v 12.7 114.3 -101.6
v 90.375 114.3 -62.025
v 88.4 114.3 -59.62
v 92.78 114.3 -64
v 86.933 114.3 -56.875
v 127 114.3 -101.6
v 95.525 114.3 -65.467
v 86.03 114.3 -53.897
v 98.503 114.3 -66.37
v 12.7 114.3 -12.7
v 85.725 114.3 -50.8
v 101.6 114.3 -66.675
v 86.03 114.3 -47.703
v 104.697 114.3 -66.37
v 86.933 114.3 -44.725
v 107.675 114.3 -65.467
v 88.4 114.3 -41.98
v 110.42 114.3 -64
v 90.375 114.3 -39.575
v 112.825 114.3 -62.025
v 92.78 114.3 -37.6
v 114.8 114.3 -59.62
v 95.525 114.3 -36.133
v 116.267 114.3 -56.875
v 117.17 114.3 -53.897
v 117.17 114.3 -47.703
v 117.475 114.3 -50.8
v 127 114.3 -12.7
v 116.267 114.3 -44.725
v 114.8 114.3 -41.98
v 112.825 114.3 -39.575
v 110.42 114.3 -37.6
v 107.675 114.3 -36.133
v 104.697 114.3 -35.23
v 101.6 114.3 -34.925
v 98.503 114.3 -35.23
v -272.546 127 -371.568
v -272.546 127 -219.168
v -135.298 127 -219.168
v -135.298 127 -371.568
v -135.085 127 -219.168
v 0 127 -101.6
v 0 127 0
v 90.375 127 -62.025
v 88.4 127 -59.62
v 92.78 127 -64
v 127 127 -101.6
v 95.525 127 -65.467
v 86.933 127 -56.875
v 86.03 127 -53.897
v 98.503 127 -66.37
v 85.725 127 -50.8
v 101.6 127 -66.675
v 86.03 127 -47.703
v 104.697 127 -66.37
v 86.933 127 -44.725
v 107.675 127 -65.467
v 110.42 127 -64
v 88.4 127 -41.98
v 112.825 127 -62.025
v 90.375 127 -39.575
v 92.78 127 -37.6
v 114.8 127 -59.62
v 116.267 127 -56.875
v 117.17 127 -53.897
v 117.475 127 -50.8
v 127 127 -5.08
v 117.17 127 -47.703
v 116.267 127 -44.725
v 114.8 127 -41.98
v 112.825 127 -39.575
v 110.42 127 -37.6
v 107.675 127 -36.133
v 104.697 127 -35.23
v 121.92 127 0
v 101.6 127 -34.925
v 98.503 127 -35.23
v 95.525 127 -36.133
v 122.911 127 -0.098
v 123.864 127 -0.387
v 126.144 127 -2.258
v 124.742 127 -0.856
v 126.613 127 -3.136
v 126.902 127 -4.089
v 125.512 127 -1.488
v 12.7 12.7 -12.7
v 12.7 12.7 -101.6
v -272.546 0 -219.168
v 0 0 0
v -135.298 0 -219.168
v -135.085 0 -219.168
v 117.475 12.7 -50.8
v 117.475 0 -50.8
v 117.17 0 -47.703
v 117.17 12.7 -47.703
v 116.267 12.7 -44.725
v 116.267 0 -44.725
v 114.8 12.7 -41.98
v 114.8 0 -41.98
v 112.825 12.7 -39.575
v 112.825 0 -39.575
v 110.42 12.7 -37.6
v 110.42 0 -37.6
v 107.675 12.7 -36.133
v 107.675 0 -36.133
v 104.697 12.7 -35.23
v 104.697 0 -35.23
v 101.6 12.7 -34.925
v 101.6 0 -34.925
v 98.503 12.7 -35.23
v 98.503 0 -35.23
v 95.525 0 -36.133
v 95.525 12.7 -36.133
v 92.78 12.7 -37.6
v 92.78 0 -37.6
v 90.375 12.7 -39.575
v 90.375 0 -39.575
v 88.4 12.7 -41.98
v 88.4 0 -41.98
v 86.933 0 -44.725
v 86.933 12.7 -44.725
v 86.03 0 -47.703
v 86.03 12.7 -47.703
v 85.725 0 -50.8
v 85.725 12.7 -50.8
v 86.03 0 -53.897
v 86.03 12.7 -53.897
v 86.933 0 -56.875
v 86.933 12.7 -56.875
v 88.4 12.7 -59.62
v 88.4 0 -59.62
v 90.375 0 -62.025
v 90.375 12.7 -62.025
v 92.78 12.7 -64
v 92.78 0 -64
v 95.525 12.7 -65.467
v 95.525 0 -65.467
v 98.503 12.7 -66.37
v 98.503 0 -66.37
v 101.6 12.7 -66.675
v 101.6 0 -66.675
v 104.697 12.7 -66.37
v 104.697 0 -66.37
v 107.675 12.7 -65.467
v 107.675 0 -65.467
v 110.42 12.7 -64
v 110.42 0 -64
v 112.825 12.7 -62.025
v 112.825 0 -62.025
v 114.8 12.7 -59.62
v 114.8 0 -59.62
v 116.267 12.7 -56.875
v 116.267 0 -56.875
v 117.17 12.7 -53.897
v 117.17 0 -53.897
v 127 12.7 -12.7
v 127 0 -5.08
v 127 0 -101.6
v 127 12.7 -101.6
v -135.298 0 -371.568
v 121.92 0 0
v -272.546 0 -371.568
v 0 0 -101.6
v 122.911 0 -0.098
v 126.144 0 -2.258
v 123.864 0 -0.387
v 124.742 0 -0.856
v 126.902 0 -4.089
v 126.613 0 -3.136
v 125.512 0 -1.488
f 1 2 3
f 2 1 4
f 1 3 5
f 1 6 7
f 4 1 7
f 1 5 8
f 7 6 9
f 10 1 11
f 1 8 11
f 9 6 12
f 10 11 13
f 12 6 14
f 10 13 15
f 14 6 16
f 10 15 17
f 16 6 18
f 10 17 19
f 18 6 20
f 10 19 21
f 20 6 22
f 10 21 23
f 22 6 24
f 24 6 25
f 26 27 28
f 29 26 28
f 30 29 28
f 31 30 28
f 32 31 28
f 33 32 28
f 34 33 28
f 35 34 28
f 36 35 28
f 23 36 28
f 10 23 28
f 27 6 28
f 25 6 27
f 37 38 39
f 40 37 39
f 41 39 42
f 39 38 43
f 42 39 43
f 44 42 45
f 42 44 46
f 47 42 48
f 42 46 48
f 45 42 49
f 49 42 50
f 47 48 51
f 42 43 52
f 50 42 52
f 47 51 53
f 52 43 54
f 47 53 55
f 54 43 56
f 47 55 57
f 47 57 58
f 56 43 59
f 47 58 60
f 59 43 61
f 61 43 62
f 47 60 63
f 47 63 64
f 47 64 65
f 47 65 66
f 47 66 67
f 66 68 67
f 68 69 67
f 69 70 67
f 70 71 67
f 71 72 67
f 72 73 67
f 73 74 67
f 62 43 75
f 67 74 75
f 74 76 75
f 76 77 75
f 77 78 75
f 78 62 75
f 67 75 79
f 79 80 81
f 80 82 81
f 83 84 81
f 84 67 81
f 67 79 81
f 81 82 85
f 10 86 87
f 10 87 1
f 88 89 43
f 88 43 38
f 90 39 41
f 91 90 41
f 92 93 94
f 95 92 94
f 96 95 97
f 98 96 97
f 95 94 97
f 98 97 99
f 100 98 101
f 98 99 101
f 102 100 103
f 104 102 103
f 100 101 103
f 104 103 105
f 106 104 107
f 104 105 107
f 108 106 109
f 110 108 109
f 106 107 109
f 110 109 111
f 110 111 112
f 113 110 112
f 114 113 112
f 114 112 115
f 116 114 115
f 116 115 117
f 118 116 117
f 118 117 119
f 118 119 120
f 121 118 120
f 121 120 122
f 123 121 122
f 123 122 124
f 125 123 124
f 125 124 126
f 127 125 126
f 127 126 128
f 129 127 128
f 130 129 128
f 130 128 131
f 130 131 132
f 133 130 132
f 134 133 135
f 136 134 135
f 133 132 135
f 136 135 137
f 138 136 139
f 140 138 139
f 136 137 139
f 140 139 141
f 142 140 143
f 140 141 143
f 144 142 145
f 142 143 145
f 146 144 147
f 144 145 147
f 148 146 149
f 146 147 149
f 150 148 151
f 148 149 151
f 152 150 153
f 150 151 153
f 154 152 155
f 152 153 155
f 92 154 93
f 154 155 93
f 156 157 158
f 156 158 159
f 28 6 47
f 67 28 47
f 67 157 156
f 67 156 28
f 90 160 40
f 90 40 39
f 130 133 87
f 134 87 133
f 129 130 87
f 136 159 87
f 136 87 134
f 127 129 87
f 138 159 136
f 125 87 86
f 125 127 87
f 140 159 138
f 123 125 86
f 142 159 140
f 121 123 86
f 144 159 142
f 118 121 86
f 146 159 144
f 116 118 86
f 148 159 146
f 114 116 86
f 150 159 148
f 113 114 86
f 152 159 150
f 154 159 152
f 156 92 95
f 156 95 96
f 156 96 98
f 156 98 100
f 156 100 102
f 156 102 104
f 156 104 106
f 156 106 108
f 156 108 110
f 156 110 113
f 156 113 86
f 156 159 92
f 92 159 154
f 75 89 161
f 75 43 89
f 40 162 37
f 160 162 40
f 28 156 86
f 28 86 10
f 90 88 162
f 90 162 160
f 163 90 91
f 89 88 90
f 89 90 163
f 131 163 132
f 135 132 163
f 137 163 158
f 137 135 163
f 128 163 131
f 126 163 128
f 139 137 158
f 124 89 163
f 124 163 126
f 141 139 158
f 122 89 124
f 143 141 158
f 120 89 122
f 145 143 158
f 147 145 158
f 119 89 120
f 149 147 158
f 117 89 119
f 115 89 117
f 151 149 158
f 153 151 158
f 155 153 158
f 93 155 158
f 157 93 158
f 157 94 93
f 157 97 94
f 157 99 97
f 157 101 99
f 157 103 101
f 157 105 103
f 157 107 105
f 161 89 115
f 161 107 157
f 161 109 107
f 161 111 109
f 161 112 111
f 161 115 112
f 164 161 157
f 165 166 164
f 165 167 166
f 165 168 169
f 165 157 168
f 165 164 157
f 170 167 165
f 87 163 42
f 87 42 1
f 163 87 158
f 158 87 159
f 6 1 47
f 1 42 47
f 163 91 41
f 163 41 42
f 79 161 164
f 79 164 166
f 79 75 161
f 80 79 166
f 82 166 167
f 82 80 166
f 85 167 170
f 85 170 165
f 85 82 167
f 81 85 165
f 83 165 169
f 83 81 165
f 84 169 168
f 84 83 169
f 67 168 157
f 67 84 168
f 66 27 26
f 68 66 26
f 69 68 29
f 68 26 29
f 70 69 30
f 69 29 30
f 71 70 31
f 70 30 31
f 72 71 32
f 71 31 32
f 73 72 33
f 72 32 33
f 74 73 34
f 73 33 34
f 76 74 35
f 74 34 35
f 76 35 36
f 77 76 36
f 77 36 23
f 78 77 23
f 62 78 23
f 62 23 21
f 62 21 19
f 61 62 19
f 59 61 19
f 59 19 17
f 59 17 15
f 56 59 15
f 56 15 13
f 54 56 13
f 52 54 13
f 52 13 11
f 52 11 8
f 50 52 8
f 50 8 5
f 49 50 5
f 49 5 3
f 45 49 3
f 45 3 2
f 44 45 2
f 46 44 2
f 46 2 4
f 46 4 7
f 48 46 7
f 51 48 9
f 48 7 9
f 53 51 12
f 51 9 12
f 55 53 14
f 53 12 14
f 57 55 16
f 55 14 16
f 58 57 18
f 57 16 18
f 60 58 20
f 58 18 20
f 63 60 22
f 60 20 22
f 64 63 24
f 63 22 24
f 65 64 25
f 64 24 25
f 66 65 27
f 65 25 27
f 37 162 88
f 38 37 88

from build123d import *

# Parameters (mm, degrees)
F0_W      = 127
F0_H      = 127
F1_DEPTH  = 101.6
F2_W      = 101.6
F2_H      = 88.9
F3_DEPTH  = 114.3
F4_R      = 15.875
F5_DEPTH  = 127.001
F6_R      = 5.08
F8_DEPTH  = 127
F9_W      = 137.247718
F9_H      = 152.4
F10_DEPTH = 127


with BuildPart() as f1:
    # F0 (on Top) → F1 (new body)
    with BuildSketch(Plane.XY):
        with Locations((63.5, 63.5)):
            Rectangle(F0_W, F0_H)
    extrude(amount=-F1_DEPTH)

    # F2 (on face) → F3 (cut)
    with BuildSketch(Plane.YZ.offset(127)):
        with Locations((63.5, -57.15)):
            Rectangle(F2_W, F2_H)
    extrude(amount=-F3_DEPTH, mode=Mode.SUBTRACT)

    # F4 (on face) → F5 (cut, through all)
    with BuildSketch(Plane.XZ):
        with Locations((101.6, -50.8)):
            Circle(F4_R)
    extrude(amount=-F5_DEPTH, mode=Mode.SUBTRACT)

    # F6
    f6_edges = [f1.edges().sort_by_distance(p)[0] for p in [
        (127, 63.5, 0),
    ]]
    fillet(f6_edges, radius=F6_R)

    # F7 (on face) → F8 (join)
    with BuildSketch(Plane.XZ):
        Polygon((0, -101.6), (0, 0), (-272.546083, -219.168201), (-135.084967, -219.168201), align=None)
    extrude(amount=-F8_DEPTH)

    # F9 (on face) → F10 (join)
    with BuildSketch(Plane.XZ):
        with Locations((-203.922224, -295.368201)):
            Rectangle(F9_W, F9_H)
    extrude(amount=-F10_DEPTH)


solid = f1.part
